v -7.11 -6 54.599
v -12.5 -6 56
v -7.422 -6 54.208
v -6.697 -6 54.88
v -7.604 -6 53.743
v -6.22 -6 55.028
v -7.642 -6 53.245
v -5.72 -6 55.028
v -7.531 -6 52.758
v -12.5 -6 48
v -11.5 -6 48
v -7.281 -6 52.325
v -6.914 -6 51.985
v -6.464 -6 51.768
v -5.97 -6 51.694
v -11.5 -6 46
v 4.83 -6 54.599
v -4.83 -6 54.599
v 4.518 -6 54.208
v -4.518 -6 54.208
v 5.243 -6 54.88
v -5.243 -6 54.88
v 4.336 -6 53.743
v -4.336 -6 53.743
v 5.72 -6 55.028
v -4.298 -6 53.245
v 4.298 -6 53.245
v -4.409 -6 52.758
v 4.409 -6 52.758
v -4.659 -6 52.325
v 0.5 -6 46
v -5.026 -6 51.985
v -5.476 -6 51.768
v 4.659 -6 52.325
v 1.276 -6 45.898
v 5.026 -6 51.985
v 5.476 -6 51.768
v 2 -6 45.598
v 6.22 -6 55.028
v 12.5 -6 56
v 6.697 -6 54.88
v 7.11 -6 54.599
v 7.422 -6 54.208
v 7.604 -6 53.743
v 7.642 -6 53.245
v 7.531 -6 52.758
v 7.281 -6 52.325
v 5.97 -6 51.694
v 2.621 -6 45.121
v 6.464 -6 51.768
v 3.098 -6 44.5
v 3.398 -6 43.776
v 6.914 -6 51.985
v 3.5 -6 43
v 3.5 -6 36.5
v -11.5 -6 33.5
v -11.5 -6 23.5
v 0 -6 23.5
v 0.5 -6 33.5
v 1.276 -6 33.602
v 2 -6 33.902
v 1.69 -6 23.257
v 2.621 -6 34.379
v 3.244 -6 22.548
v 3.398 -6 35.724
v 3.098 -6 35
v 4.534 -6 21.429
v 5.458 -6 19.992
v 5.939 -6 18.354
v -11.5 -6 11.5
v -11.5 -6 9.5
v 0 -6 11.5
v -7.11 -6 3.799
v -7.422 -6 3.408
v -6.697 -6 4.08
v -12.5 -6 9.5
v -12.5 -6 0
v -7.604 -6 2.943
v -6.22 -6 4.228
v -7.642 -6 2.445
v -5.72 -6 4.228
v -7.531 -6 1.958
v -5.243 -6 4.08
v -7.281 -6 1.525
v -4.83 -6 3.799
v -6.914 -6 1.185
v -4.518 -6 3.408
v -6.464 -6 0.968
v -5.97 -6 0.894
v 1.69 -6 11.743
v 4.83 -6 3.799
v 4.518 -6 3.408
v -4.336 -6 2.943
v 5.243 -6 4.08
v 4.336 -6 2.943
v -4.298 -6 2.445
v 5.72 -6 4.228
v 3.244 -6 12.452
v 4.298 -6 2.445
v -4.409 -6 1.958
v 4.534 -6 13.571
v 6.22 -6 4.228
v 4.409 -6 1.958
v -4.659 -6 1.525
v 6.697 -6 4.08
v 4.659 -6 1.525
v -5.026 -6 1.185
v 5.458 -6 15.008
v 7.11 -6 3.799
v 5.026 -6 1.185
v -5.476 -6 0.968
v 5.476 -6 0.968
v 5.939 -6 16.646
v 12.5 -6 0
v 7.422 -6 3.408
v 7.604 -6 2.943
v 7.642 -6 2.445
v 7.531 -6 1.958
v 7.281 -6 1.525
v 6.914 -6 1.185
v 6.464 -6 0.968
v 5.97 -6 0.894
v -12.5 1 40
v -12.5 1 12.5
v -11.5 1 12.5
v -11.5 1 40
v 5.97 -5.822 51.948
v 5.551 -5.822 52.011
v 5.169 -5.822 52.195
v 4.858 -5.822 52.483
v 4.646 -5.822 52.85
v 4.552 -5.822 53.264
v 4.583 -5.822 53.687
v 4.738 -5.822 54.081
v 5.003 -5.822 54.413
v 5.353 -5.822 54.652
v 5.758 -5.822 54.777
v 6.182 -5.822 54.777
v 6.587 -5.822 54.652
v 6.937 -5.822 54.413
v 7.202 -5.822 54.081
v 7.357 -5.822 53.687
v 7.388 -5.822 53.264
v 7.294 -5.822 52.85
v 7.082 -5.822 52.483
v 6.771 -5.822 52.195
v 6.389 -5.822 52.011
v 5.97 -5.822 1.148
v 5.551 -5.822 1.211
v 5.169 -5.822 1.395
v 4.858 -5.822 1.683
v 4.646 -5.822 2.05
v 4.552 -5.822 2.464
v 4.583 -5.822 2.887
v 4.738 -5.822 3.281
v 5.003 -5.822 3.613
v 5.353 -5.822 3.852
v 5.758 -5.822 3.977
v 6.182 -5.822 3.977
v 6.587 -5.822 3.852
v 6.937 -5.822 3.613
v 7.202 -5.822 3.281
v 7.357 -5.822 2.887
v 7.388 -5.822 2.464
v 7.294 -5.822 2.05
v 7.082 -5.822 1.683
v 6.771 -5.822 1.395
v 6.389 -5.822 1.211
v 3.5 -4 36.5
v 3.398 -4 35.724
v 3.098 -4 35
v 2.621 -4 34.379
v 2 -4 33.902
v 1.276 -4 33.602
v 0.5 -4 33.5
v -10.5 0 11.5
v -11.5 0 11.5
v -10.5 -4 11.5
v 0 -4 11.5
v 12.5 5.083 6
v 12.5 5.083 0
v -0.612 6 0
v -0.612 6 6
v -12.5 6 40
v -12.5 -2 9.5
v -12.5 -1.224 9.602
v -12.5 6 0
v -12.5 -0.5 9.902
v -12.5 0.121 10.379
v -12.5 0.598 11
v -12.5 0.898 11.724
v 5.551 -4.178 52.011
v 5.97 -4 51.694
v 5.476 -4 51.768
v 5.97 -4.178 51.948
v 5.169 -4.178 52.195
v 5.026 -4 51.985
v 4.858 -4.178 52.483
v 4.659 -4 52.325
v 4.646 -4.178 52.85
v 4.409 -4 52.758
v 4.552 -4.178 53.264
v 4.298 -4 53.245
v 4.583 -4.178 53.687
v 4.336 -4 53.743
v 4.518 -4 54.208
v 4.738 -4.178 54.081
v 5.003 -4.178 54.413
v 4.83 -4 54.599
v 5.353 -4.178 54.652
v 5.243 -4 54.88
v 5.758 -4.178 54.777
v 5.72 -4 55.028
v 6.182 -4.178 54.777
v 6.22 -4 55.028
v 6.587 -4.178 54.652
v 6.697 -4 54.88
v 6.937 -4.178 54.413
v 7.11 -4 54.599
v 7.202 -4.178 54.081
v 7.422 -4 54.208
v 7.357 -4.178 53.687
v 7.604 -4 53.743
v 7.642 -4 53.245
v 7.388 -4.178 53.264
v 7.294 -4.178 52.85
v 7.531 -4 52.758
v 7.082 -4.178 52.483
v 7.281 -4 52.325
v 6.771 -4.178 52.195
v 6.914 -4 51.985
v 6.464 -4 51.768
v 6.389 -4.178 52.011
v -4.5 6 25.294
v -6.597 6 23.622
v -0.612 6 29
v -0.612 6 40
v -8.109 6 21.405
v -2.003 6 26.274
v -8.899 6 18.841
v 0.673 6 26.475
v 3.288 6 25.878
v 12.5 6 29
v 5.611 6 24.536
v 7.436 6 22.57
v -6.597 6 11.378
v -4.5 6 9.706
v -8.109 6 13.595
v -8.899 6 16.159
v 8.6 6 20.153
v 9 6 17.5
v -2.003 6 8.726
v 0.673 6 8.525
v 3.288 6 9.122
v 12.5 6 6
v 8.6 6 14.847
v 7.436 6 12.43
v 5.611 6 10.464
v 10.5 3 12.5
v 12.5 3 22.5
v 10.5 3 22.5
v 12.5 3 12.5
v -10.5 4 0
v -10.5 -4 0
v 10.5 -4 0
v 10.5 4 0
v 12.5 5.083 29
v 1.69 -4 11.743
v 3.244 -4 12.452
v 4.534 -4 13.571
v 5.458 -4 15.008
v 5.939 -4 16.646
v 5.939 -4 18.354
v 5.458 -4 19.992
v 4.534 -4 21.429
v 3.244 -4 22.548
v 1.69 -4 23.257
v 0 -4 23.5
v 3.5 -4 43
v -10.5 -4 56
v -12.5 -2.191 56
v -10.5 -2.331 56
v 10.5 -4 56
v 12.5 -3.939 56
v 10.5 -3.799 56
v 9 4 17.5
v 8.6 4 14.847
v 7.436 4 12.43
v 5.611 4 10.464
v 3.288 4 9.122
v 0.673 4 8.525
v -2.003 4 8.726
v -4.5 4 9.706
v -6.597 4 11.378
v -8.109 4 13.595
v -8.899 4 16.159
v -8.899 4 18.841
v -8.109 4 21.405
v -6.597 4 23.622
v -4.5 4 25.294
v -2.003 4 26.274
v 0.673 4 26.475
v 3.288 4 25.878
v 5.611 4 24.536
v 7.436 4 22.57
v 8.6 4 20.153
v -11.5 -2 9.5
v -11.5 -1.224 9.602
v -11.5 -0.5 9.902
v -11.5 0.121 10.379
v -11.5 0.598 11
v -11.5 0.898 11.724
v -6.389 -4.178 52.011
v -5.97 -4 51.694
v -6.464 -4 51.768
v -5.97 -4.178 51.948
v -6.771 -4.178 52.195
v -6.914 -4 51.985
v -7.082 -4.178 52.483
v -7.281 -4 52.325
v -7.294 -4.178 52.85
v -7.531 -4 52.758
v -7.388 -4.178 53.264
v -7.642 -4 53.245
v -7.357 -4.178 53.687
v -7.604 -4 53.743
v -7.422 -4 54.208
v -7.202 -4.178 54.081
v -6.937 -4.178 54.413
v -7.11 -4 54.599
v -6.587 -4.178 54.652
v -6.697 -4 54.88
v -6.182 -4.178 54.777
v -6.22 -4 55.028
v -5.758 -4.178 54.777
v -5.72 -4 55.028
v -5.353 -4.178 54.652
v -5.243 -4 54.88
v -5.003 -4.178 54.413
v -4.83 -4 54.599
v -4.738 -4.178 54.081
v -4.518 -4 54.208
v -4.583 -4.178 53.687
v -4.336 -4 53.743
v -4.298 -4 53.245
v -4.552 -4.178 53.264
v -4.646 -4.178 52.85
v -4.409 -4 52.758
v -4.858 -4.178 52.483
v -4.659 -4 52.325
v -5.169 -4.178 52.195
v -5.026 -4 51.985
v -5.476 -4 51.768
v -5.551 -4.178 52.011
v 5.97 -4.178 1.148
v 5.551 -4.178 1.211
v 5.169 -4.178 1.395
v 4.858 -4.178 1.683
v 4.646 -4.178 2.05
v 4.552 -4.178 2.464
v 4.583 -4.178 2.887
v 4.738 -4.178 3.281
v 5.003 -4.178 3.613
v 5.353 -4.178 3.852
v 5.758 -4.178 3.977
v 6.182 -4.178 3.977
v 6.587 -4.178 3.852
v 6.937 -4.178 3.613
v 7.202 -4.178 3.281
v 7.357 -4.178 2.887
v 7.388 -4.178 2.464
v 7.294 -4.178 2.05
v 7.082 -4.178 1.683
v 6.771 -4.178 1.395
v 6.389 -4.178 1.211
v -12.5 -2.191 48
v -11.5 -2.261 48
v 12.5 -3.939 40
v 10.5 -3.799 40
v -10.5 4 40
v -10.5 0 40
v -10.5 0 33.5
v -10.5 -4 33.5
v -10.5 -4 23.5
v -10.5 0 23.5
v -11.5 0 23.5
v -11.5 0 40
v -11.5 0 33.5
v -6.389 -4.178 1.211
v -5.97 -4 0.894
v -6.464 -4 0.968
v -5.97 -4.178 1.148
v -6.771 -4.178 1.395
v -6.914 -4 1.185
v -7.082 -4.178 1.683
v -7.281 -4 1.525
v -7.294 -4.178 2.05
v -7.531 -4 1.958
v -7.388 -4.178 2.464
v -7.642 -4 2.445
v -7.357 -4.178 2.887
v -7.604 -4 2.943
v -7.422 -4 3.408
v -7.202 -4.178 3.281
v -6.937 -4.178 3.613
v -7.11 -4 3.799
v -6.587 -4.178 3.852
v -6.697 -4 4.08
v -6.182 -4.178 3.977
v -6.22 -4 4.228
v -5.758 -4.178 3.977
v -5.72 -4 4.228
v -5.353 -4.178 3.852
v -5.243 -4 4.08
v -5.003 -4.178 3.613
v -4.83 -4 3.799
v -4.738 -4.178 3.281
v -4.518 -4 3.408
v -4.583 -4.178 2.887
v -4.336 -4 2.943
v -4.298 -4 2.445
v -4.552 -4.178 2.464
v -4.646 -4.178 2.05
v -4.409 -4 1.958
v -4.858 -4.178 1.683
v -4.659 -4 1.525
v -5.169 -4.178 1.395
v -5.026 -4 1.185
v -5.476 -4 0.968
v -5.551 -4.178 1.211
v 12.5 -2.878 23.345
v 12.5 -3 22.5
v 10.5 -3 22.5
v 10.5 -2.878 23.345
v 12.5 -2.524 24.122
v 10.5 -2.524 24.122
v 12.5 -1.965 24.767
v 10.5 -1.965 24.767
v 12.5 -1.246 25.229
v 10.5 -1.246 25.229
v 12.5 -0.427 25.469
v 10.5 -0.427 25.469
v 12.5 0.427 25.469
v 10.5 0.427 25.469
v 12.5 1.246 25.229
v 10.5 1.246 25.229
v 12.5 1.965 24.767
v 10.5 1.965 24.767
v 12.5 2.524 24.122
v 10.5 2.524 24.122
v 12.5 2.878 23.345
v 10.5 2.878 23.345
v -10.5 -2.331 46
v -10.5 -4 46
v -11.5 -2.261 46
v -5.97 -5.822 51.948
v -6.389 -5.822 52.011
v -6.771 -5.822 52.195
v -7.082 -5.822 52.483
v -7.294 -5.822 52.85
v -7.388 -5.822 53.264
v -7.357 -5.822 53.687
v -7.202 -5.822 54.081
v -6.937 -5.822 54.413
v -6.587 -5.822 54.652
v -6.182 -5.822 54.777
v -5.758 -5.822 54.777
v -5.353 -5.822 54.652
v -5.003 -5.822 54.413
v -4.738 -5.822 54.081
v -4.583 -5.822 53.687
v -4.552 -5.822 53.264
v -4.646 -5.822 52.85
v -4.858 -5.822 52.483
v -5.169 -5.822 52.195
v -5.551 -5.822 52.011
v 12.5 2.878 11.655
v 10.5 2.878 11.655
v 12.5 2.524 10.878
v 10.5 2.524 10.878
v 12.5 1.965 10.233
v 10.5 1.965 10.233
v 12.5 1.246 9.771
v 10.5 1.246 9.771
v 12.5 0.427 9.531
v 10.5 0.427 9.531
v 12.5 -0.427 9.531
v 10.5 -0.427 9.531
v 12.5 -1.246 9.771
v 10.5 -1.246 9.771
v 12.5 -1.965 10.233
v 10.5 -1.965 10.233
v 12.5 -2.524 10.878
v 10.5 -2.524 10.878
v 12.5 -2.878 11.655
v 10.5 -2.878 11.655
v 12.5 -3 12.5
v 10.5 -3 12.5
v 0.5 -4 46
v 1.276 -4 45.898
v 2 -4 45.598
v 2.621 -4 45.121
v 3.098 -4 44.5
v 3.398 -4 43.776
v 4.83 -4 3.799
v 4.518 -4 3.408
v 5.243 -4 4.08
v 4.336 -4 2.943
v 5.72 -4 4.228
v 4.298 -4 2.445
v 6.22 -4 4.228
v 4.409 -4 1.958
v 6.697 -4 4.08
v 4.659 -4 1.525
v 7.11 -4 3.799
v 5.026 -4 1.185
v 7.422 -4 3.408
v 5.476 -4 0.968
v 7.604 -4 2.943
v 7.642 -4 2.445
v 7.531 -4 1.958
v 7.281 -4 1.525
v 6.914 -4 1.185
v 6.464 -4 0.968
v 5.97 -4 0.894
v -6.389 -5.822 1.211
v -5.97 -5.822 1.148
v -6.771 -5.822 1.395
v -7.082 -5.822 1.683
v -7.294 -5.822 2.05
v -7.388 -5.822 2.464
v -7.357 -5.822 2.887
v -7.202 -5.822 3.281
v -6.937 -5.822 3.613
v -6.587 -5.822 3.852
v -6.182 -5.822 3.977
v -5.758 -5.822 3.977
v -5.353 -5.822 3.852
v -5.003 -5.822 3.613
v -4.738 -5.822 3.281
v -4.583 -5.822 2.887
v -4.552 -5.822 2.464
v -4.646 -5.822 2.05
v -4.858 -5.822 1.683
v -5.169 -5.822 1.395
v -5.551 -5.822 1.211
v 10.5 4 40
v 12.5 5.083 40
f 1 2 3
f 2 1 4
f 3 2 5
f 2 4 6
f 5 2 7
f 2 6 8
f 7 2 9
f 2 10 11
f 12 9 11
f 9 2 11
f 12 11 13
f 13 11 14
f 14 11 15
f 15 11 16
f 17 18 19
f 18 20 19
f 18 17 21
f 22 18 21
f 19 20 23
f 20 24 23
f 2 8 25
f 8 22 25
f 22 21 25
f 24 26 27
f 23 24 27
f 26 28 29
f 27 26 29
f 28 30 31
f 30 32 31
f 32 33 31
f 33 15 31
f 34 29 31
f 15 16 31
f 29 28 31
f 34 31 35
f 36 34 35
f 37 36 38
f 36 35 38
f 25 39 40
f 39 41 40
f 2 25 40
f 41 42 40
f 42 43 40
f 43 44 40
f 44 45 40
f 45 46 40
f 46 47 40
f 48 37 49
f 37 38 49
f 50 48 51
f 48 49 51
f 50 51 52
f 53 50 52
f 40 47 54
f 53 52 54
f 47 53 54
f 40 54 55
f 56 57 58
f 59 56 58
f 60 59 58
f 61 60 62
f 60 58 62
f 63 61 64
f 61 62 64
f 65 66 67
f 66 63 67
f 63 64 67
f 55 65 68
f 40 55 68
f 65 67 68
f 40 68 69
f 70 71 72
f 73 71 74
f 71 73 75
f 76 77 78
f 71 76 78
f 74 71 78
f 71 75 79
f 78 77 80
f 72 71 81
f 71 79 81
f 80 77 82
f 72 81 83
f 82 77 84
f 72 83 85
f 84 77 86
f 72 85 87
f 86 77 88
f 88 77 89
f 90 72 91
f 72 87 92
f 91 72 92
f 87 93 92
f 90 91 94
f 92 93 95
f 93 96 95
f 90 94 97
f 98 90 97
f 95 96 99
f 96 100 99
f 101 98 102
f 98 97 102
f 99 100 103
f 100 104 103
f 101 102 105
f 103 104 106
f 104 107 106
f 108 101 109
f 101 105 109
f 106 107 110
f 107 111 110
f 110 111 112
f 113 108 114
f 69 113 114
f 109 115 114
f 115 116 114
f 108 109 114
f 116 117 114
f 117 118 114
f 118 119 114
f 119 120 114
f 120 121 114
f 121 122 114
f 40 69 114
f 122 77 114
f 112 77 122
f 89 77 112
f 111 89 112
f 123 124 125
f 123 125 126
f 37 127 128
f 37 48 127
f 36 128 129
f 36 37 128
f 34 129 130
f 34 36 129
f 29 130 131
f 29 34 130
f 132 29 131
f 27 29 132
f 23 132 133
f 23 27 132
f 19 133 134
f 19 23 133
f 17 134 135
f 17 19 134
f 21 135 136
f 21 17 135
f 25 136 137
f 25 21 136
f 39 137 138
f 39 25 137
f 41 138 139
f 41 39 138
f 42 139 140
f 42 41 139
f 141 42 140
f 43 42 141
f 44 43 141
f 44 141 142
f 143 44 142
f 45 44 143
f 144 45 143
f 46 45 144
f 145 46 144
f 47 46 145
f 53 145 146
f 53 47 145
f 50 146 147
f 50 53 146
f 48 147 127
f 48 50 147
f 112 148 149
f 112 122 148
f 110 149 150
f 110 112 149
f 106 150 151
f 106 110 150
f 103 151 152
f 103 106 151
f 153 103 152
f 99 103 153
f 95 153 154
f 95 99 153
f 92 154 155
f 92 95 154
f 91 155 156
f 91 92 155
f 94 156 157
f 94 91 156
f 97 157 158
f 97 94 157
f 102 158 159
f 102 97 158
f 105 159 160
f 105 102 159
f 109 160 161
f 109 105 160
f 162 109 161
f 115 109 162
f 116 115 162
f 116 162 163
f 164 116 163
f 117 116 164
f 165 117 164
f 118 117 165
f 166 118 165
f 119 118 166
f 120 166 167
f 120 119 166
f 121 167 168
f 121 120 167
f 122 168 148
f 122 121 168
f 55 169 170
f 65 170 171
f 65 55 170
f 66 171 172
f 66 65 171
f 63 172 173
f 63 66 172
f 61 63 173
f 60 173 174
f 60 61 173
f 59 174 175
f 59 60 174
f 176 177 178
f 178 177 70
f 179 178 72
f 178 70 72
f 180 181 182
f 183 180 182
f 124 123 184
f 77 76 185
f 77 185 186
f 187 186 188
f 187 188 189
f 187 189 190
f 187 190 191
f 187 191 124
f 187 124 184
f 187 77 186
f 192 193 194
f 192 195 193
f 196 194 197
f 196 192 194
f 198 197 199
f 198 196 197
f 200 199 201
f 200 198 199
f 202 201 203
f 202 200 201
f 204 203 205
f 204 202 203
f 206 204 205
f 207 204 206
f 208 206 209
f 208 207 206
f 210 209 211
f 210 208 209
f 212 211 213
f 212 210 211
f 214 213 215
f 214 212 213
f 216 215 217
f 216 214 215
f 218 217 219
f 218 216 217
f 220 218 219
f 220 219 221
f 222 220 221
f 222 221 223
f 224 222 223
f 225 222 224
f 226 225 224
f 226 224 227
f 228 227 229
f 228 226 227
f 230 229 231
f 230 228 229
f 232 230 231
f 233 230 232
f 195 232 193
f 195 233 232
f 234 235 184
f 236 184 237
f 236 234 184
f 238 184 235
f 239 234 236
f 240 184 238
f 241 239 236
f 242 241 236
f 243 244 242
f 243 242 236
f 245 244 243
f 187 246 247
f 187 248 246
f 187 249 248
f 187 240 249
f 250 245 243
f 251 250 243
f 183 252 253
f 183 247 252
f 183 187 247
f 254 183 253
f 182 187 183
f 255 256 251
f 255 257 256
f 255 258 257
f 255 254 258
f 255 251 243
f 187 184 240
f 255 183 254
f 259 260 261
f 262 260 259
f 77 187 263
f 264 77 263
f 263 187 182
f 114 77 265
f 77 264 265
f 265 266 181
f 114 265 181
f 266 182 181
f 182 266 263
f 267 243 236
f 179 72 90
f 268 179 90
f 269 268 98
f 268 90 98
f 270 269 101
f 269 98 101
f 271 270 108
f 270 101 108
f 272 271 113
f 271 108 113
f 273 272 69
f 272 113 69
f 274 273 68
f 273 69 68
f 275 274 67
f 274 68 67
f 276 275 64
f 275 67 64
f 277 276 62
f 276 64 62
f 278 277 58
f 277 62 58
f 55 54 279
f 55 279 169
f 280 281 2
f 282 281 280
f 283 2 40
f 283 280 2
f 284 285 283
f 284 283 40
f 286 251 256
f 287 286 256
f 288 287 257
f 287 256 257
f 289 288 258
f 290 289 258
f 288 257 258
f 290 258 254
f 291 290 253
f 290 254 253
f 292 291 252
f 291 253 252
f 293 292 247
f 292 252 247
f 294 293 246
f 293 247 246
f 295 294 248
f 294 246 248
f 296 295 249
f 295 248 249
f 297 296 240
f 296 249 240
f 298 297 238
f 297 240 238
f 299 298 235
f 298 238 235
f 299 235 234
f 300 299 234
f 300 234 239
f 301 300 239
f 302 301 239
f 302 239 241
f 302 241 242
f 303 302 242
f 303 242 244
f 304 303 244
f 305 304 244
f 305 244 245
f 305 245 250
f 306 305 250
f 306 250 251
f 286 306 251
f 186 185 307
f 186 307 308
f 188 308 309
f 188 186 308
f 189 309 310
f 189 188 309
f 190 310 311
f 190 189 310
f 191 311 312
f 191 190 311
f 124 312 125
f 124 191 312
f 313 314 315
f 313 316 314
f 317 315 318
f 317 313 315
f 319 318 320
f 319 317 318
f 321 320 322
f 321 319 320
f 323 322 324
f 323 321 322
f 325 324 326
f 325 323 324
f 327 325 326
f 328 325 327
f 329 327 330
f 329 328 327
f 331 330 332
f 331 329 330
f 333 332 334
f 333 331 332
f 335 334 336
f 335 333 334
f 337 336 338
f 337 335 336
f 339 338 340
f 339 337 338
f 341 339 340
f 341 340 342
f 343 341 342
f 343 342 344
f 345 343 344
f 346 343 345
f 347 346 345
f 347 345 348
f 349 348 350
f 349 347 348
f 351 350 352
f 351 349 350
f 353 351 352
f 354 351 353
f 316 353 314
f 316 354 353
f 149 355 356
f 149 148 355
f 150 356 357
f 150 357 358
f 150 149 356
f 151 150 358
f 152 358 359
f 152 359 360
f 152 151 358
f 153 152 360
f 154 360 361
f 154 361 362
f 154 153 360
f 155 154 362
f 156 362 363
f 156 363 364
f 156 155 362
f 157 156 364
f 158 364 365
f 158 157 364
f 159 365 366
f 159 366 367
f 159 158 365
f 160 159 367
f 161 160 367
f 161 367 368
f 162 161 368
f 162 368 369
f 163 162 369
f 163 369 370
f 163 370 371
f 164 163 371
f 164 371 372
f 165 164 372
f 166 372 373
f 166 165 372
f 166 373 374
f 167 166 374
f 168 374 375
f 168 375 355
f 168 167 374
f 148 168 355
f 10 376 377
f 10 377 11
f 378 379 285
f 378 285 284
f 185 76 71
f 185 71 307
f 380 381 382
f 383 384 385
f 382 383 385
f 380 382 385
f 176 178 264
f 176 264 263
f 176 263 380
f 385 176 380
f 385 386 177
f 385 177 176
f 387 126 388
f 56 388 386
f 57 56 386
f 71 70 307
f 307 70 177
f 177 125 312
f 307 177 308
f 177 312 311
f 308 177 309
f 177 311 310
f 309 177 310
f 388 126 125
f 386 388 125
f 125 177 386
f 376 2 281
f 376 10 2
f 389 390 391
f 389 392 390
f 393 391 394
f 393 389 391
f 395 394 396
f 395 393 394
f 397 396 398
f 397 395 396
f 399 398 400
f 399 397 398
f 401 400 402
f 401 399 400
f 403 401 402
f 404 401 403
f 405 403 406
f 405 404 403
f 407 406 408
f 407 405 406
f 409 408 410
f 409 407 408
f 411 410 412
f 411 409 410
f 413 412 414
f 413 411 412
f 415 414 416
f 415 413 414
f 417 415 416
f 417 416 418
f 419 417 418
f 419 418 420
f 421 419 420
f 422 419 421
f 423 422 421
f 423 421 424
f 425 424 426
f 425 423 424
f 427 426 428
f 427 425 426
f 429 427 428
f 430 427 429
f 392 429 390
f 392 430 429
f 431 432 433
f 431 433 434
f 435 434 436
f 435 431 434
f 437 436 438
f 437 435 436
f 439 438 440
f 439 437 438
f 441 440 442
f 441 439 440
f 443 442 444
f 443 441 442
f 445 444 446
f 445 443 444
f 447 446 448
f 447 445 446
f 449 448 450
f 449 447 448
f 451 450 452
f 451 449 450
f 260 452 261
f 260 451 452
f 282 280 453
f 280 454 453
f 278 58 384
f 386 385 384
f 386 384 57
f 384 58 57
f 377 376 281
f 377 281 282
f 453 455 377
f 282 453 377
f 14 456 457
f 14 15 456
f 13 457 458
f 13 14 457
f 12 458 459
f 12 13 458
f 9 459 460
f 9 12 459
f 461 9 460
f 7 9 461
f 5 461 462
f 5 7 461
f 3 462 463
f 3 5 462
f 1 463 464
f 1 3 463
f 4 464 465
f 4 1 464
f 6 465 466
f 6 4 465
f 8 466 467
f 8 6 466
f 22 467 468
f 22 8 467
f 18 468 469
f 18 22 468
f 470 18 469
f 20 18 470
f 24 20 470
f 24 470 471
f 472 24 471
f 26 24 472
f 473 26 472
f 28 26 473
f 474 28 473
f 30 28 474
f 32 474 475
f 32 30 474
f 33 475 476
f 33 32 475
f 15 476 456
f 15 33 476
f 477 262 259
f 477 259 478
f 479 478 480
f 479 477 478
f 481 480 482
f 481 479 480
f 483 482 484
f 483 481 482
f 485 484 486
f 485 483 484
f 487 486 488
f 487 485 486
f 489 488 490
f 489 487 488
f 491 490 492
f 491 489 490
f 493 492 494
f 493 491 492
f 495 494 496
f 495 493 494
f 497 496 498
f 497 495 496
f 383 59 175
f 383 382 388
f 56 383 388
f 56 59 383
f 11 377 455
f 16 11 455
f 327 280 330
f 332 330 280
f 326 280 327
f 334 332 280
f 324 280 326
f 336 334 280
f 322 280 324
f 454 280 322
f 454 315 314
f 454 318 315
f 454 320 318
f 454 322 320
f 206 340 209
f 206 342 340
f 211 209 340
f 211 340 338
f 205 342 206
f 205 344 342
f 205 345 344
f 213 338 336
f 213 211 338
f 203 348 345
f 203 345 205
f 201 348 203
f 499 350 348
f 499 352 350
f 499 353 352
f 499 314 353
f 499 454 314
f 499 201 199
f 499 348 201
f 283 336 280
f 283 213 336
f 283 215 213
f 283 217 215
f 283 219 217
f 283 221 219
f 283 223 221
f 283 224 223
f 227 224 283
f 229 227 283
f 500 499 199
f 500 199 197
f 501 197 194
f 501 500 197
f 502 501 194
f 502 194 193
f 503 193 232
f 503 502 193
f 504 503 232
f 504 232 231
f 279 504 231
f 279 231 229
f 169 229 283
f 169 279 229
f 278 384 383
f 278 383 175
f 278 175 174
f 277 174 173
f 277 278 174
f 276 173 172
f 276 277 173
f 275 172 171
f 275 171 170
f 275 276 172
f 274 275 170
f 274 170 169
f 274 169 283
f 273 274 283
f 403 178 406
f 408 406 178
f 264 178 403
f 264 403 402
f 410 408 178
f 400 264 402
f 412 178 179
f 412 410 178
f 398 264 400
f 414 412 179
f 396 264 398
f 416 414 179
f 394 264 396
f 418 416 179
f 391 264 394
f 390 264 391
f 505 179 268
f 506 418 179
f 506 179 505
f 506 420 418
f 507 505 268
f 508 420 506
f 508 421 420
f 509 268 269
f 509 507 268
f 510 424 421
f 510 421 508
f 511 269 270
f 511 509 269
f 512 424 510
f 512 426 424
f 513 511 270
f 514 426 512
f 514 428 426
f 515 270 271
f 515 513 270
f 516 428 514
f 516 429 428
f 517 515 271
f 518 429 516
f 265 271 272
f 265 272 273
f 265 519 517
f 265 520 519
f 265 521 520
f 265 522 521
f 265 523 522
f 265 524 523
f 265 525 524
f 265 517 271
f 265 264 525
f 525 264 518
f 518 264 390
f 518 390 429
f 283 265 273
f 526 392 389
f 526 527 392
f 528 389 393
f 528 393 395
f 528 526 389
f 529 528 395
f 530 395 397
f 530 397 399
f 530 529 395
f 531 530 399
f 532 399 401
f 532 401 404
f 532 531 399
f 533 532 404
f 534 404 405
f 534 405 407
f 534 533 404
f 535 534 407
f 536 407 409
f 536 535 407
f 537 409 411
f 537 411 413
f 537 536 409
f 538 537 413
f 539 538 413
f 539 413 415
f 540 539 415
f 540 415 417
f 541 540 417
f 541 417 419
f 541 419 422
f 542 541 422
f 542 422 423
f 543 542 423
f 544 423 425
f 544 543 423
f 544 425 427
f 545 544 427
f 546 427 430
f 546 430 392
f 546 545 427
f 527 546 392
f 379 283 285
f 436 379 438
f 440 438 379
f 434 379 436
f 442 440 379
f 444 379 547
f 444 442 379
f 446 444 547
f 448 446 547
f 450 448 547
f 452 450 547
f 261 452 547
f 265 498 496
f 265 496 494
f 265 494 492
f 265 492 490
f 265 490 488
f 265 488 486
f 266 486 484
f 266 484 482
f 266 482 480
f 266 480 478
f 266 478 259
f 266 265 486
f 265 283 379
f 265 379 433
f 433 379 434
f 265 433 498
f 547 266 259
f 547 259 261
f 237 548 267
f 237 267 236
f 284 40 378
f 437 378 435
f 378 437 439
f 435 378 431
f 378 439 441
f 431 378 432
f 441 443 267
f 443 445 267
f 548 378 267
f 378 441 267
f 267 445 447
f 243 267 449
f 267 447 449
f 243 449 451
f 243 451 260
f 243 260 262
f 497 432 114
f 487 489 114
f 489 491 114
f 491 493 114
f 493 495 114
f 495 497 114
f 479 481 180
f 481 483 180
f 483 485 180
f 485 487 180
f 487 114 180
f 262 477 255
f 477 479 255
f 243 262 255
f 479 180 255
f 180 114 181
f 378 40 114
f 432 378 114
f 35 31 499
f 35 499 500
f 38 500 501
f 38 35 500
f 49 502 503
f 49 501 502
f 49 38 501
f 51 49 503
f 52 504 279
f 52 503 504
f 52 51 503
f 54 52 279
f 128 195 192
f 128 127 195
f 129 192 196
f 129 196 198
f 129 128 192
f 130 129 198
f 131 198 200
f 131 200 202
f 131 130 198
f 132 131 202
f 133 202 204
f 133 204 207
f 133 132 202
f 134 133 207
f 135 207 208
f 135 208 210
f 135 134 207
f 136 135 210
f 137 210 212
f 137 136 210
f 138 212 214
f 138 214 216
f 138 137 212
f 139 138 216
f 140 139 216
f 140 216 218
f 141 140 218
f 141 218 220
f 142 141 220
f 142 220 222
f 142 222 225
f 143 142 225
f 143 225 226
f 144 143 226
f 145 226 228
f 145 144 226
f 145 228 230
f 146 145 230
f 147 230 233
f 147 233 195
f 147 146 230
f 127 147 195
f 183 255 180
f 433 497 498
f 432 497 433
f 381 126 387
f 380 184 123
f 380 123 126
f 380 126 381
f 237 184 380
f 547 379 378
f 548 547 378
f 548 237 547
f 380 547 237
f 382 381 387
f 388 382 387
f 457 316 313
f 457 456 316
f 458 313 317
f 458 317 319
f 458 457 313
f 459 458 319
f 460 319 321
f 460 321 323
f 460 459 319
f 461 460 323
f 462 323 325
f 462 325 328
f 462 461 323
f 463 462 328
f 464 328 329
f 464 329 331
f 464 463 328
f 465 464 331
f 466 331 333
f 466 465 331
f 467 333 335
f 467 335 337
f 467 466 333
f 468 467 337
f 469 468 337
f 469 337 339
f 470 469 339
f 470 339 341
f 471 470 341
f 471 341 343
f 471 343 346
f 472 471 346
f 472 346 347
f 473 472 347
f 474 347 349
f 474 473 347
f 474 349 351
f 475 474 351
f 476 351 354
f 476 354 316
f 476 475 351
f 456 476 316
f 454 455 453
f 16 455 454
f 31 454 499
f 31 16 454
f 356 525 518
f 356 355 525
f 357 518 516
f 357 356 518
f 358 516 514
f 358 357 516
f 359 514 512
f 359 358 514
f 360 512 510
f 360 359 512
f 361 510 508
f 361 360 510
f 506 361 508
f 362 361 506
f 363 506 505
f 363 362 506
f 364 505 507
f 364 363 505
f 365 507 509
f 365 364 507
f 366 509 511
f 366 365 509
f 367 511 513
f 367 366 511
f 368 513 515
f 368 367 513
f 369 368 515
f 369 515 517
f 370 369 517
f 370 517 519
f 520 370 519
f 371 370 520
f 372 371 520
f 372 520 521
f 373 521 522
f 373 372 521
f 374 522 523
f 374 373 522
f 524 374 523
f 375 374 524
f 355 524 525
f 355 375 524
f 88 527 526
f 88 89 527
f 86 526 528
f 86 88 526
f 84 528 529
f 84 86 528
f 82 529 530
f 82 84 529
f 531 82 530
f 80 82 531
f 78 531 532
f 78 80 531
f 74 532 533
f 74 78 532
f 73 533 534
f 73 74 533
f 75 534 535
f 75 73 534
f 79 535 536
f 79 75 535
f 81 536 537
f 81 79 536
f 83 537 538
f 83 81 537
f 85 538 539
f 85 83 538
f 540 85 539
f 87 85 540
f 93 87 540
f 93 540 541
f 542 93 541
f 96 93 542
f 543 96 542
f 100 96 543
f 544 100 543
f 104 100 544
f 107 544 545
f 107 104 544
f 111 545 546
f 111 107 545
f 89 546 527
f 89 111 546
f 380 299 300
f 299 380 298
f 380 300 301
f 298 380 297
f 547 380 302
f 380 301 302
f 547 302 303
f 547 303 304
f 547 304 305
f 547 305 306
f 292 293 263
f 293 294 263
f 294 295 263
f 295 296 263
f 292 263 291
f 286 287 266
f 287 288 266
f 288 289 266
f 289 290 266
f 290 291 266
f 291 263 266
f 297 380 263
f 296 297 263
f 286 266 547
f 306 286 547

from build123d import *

# Parameters (mm, degrees)
SKETCH_1_W                   = 25
SKETCH_1_H                   = 12
SKETCH_1_W_2                 = 21
SKETCH_1_H_2                 = 8
EXTRUDE_1_DEPTH              = 56
CUT_EXTRUDE_1_REACH          = 14
SKETCH_2_R                   = 9
HOLE_WIZARD_4_401_AT_2_COUNT = 2
HOLE_WIZARD_4_401_AT_2_PITCH = 50.8
HOLE_WIZARD_4_401_AT_3_COUNT = 2
HOLE_WIZARD_4_401_AT_3_PITCH = 52.184323316
HOLE_WIZARD_4_401_AT_4_COUNT = 2
HOLE_WIZARD_4_401_AT_4_PITCH = 11.94
CUT_EXTRUDE_2_DEPTH          = 6
CUT_EXTRUDE_4_DEPTH          = 1
CUT_EXTRUDE_8_REACH          = 27
CUT_EXTRUDE_9_DEPTH          = 6
CUT_EXTRUDE_START            = -56
CUT_EXTRUDE_10_DEPTH         = 27
SKETCH_15_W                  = 30.69445118
SKETCH_15_H                  = 18.97035636
CUT_EXTRUDE_11_DEPTH         = 9


with BuildPart() as part:
    # Sketch 1 → Extrude 1 (new body)
    with BuildSketch(Plane.XY):
        Rectangle(SKETCH_1_W, SKETCH_1_H)
        Rectangle(SKETCH_1_W_2, SKETCH_1_H_2, mode=Mode.SUBTRACT)
    extrude(amount=EXTRUDE_1_DEPTH)

    # Sketch 2 → Cut-Extrude 1 (cut, up to next)
    with BuildSketch(Plane(origin=(0, 6, 0), x_dir=(1, 0, 0), z_dir=(0, 1, 0)), mode=Mode.PRIVATE) as cut_extrude_1_sk1:
        with Locations((0, -17.5)):
            Circle(SKETCH_2_R)
    cut_extrude_1_tool1 = extrude(cut_extrude_1_sk1.sketch, amount=-CUT_EXTRUDE_1_REACH, mode=Mode.PRIVATE) & part.part
    add(cut_extrude_1_tool1.solids().sort_by_distance((0, 6, 17.5))[0], mode=Mode.SUBTRACT)

    # Sketch 3 → Hole Wizard 4-401 (revolve, cut)
    with BuildSketch(Plane(origin=(5.97, -6, 53.37), x_dir=(0, 0, -1), z_dir=(1, 0, 0))):
        Polygon((0, 0), (0, 2), (1.6764, 2), (1.4224, 1.822147285), (1.4224, 0.177852715), (1.6764, 0), align=None)
    hole_wizard_4_401 = revolve(axis=Axis((5.97, -12.35, 53.37), (0, 1, 0)), mode=Mode.SUBTRACT)

    # Hole Wizard 4-401 at 2: Hole Wizard 4-401 ×2
    with Locations(*[(0, 0, -i * HOLE_WIZARD_4_401_AT_2_PITCH) for i in range(1, HOLE_WIZARD_4_401_AT_2_COUNT)]):
        add(hole_wizard_4_401, mode=Mode.SUBTRACT)

    # Hole Wizard 4-401 at 3: Hole Wizard 4-401 ×2
    with Locations(*[Vector(-0.228804347, 0, -0.973472429) * (i * HOLE_WIZARD_4_401_AT_3_PITCH) for i in range(1, HOLE_WIZARD_4_401_AT_3_COUNT)]):
        add(hole_wizard_4_401, mode=Mode.SUBTRACT)

    # Hole Wizard 4-401 at 4: Hole Wizard 4-401 ×2
    with Locations(*[(-i * HOLE_WIZARD_4_401_AT_4_PITCH, 0, 0) for i in range(1, HOLE_WIZARD_4_401_AT_4_COUNT)]):
        add(hole_wizard_4_401, mode=Mode.SUBTRACT)

    # Sketch 5 → Cut-Extrude 2 (cut)
    with BuildSketch(Plane.XZ.offset(6)):
        with BuildLine():
            Line((-12.5, 11.5), (0, 11.5))
            ThreePointArc((0, 11.5), (6, 17.5), (0, 23.5))
            Line((0, 23.5), (-12.5, 23.5))
            Line((-12.5, 23.5), (-12.5, 11.5))
        make_face()
        with BuildLine():
            Line((-12.5, 46), (0.5, 46))
            ThreePointArc((0.5, 46), (2.621320344, 45.121320344), (3.5, 43))
            Line((3.5, 43), (3.5, 36.5))
            ThreePointArc((3.5, 36.5), (2.621320344, 34.378679656), (0.5, 33.5))
            Line((0.5, 33.5), (-12.5, 33.5))
            Line((-12.5, 33.5), (-12.5, 46))
        make_face()
    extrude(amount=-CUT_EXTRUDE_2_DEPTH, mode=Mode.SUBTRACT)

    # Sketch 8 → Cut-Extrude 4 (cut)
    with BuildSketch(Plane.ZY.offset(12.5)):
        with BuildLine():
            Line((9.5, -6), (9.5, -2))
            ThreePointArc((9.5, -2), (10.378679656, 0.121320344), (12.5, 1))
            Line((12.5, 1), (45, 1))
            ThreePointArc((45, 1), (47.121320344, 0.121320344), (48, -2))
            Line((48, -2), (48, -6))
            Line((48, -6), (9.5, -6))
        make_face()
    extrude(amount=-CUT_EXTRUDE_4_DEPTH, mode=Mode.SUBTRACT)

    # Sketch 13 → Cut-Extrude 8 (cut, up to next)
    with BuildSketch(Plane(origin=(12.5, 0, 0), x_dir=(0, 0, -1), z_dir=(1, 0, 0)), mode=Mode.PRIVATE) as cut_extrude_8_sk1:
        with BuildLine():
            Line((-22.5, 3), (-12.5, 3))
            ThreePointArc((-12.5, 3), (-9.5, 0), (-12.5, -3))
            Line((-12.5, -3), (-22.5, -3))
            ThreePointArc((-22.5, -3), (-25.5, 0), (-22.5, 3))
        make_face()
    cut_extrude_8_tool1 = extrude(cut_extrude_8_sk1.sketch, amount=-CUT_EXTRUDE_8_REACH, mode=Mode.PRIVATE) & part.part
    add(cut_extrude_8_tool1.solids().sort_by_distance((12.5, 0, 17.5))[0], mode=Mode.SUBTRACT)

    # Sketch 14 → Cut-Extrude 9 (cut)
    with BuildSketch(Plane(origin=(0, 0, 0), x_dir=(-1, 0, 0), z_dir=(0, 0, -1))):
        Polygon((-12.5, 6), (-12.5, 5.083085997), (0.612481145, 6), align=None)
    extrude(amount=-CUT_EXTRUDE_9_DEPTH, mode=Mode.SUBTRACT)

    # Sketch 14_3 → Cut-Extrude 10 (cut)
    with BuildSketch(Plane(origin=(0, 0, 0), x_dir=(-1, 0, 0), z_dir=(0, 0, -1)).offset(CUT_EXTRUDE_START)):
        Polygon((-12.5, 6), (-12.5, 5.083085997), (0.612481145, 6), align=None)
    extrude(amount=CUT_EXTRUDE_10_DEPTH, mode=Mode.SUBTRACT)

    # Sketch 15 → Cut-Extrude 11 (cut)
    with BuildSketch(Plane(origin=(0.414538991, 5.928183756, 0), x_dir=(0.99756405, -0.069756474, 0), z_dir=(0.069756474, 0.99756405, 0))):
        with Locations((-0.241417032, -49.48517818)):
            Rectangle(SKETCH_15_W, SKETCH_15_H)
    extrude(amount=-CUT_EXTRUDE_11_DEPTH, mode=Mode.SUBTRACT)


solid = part.part
